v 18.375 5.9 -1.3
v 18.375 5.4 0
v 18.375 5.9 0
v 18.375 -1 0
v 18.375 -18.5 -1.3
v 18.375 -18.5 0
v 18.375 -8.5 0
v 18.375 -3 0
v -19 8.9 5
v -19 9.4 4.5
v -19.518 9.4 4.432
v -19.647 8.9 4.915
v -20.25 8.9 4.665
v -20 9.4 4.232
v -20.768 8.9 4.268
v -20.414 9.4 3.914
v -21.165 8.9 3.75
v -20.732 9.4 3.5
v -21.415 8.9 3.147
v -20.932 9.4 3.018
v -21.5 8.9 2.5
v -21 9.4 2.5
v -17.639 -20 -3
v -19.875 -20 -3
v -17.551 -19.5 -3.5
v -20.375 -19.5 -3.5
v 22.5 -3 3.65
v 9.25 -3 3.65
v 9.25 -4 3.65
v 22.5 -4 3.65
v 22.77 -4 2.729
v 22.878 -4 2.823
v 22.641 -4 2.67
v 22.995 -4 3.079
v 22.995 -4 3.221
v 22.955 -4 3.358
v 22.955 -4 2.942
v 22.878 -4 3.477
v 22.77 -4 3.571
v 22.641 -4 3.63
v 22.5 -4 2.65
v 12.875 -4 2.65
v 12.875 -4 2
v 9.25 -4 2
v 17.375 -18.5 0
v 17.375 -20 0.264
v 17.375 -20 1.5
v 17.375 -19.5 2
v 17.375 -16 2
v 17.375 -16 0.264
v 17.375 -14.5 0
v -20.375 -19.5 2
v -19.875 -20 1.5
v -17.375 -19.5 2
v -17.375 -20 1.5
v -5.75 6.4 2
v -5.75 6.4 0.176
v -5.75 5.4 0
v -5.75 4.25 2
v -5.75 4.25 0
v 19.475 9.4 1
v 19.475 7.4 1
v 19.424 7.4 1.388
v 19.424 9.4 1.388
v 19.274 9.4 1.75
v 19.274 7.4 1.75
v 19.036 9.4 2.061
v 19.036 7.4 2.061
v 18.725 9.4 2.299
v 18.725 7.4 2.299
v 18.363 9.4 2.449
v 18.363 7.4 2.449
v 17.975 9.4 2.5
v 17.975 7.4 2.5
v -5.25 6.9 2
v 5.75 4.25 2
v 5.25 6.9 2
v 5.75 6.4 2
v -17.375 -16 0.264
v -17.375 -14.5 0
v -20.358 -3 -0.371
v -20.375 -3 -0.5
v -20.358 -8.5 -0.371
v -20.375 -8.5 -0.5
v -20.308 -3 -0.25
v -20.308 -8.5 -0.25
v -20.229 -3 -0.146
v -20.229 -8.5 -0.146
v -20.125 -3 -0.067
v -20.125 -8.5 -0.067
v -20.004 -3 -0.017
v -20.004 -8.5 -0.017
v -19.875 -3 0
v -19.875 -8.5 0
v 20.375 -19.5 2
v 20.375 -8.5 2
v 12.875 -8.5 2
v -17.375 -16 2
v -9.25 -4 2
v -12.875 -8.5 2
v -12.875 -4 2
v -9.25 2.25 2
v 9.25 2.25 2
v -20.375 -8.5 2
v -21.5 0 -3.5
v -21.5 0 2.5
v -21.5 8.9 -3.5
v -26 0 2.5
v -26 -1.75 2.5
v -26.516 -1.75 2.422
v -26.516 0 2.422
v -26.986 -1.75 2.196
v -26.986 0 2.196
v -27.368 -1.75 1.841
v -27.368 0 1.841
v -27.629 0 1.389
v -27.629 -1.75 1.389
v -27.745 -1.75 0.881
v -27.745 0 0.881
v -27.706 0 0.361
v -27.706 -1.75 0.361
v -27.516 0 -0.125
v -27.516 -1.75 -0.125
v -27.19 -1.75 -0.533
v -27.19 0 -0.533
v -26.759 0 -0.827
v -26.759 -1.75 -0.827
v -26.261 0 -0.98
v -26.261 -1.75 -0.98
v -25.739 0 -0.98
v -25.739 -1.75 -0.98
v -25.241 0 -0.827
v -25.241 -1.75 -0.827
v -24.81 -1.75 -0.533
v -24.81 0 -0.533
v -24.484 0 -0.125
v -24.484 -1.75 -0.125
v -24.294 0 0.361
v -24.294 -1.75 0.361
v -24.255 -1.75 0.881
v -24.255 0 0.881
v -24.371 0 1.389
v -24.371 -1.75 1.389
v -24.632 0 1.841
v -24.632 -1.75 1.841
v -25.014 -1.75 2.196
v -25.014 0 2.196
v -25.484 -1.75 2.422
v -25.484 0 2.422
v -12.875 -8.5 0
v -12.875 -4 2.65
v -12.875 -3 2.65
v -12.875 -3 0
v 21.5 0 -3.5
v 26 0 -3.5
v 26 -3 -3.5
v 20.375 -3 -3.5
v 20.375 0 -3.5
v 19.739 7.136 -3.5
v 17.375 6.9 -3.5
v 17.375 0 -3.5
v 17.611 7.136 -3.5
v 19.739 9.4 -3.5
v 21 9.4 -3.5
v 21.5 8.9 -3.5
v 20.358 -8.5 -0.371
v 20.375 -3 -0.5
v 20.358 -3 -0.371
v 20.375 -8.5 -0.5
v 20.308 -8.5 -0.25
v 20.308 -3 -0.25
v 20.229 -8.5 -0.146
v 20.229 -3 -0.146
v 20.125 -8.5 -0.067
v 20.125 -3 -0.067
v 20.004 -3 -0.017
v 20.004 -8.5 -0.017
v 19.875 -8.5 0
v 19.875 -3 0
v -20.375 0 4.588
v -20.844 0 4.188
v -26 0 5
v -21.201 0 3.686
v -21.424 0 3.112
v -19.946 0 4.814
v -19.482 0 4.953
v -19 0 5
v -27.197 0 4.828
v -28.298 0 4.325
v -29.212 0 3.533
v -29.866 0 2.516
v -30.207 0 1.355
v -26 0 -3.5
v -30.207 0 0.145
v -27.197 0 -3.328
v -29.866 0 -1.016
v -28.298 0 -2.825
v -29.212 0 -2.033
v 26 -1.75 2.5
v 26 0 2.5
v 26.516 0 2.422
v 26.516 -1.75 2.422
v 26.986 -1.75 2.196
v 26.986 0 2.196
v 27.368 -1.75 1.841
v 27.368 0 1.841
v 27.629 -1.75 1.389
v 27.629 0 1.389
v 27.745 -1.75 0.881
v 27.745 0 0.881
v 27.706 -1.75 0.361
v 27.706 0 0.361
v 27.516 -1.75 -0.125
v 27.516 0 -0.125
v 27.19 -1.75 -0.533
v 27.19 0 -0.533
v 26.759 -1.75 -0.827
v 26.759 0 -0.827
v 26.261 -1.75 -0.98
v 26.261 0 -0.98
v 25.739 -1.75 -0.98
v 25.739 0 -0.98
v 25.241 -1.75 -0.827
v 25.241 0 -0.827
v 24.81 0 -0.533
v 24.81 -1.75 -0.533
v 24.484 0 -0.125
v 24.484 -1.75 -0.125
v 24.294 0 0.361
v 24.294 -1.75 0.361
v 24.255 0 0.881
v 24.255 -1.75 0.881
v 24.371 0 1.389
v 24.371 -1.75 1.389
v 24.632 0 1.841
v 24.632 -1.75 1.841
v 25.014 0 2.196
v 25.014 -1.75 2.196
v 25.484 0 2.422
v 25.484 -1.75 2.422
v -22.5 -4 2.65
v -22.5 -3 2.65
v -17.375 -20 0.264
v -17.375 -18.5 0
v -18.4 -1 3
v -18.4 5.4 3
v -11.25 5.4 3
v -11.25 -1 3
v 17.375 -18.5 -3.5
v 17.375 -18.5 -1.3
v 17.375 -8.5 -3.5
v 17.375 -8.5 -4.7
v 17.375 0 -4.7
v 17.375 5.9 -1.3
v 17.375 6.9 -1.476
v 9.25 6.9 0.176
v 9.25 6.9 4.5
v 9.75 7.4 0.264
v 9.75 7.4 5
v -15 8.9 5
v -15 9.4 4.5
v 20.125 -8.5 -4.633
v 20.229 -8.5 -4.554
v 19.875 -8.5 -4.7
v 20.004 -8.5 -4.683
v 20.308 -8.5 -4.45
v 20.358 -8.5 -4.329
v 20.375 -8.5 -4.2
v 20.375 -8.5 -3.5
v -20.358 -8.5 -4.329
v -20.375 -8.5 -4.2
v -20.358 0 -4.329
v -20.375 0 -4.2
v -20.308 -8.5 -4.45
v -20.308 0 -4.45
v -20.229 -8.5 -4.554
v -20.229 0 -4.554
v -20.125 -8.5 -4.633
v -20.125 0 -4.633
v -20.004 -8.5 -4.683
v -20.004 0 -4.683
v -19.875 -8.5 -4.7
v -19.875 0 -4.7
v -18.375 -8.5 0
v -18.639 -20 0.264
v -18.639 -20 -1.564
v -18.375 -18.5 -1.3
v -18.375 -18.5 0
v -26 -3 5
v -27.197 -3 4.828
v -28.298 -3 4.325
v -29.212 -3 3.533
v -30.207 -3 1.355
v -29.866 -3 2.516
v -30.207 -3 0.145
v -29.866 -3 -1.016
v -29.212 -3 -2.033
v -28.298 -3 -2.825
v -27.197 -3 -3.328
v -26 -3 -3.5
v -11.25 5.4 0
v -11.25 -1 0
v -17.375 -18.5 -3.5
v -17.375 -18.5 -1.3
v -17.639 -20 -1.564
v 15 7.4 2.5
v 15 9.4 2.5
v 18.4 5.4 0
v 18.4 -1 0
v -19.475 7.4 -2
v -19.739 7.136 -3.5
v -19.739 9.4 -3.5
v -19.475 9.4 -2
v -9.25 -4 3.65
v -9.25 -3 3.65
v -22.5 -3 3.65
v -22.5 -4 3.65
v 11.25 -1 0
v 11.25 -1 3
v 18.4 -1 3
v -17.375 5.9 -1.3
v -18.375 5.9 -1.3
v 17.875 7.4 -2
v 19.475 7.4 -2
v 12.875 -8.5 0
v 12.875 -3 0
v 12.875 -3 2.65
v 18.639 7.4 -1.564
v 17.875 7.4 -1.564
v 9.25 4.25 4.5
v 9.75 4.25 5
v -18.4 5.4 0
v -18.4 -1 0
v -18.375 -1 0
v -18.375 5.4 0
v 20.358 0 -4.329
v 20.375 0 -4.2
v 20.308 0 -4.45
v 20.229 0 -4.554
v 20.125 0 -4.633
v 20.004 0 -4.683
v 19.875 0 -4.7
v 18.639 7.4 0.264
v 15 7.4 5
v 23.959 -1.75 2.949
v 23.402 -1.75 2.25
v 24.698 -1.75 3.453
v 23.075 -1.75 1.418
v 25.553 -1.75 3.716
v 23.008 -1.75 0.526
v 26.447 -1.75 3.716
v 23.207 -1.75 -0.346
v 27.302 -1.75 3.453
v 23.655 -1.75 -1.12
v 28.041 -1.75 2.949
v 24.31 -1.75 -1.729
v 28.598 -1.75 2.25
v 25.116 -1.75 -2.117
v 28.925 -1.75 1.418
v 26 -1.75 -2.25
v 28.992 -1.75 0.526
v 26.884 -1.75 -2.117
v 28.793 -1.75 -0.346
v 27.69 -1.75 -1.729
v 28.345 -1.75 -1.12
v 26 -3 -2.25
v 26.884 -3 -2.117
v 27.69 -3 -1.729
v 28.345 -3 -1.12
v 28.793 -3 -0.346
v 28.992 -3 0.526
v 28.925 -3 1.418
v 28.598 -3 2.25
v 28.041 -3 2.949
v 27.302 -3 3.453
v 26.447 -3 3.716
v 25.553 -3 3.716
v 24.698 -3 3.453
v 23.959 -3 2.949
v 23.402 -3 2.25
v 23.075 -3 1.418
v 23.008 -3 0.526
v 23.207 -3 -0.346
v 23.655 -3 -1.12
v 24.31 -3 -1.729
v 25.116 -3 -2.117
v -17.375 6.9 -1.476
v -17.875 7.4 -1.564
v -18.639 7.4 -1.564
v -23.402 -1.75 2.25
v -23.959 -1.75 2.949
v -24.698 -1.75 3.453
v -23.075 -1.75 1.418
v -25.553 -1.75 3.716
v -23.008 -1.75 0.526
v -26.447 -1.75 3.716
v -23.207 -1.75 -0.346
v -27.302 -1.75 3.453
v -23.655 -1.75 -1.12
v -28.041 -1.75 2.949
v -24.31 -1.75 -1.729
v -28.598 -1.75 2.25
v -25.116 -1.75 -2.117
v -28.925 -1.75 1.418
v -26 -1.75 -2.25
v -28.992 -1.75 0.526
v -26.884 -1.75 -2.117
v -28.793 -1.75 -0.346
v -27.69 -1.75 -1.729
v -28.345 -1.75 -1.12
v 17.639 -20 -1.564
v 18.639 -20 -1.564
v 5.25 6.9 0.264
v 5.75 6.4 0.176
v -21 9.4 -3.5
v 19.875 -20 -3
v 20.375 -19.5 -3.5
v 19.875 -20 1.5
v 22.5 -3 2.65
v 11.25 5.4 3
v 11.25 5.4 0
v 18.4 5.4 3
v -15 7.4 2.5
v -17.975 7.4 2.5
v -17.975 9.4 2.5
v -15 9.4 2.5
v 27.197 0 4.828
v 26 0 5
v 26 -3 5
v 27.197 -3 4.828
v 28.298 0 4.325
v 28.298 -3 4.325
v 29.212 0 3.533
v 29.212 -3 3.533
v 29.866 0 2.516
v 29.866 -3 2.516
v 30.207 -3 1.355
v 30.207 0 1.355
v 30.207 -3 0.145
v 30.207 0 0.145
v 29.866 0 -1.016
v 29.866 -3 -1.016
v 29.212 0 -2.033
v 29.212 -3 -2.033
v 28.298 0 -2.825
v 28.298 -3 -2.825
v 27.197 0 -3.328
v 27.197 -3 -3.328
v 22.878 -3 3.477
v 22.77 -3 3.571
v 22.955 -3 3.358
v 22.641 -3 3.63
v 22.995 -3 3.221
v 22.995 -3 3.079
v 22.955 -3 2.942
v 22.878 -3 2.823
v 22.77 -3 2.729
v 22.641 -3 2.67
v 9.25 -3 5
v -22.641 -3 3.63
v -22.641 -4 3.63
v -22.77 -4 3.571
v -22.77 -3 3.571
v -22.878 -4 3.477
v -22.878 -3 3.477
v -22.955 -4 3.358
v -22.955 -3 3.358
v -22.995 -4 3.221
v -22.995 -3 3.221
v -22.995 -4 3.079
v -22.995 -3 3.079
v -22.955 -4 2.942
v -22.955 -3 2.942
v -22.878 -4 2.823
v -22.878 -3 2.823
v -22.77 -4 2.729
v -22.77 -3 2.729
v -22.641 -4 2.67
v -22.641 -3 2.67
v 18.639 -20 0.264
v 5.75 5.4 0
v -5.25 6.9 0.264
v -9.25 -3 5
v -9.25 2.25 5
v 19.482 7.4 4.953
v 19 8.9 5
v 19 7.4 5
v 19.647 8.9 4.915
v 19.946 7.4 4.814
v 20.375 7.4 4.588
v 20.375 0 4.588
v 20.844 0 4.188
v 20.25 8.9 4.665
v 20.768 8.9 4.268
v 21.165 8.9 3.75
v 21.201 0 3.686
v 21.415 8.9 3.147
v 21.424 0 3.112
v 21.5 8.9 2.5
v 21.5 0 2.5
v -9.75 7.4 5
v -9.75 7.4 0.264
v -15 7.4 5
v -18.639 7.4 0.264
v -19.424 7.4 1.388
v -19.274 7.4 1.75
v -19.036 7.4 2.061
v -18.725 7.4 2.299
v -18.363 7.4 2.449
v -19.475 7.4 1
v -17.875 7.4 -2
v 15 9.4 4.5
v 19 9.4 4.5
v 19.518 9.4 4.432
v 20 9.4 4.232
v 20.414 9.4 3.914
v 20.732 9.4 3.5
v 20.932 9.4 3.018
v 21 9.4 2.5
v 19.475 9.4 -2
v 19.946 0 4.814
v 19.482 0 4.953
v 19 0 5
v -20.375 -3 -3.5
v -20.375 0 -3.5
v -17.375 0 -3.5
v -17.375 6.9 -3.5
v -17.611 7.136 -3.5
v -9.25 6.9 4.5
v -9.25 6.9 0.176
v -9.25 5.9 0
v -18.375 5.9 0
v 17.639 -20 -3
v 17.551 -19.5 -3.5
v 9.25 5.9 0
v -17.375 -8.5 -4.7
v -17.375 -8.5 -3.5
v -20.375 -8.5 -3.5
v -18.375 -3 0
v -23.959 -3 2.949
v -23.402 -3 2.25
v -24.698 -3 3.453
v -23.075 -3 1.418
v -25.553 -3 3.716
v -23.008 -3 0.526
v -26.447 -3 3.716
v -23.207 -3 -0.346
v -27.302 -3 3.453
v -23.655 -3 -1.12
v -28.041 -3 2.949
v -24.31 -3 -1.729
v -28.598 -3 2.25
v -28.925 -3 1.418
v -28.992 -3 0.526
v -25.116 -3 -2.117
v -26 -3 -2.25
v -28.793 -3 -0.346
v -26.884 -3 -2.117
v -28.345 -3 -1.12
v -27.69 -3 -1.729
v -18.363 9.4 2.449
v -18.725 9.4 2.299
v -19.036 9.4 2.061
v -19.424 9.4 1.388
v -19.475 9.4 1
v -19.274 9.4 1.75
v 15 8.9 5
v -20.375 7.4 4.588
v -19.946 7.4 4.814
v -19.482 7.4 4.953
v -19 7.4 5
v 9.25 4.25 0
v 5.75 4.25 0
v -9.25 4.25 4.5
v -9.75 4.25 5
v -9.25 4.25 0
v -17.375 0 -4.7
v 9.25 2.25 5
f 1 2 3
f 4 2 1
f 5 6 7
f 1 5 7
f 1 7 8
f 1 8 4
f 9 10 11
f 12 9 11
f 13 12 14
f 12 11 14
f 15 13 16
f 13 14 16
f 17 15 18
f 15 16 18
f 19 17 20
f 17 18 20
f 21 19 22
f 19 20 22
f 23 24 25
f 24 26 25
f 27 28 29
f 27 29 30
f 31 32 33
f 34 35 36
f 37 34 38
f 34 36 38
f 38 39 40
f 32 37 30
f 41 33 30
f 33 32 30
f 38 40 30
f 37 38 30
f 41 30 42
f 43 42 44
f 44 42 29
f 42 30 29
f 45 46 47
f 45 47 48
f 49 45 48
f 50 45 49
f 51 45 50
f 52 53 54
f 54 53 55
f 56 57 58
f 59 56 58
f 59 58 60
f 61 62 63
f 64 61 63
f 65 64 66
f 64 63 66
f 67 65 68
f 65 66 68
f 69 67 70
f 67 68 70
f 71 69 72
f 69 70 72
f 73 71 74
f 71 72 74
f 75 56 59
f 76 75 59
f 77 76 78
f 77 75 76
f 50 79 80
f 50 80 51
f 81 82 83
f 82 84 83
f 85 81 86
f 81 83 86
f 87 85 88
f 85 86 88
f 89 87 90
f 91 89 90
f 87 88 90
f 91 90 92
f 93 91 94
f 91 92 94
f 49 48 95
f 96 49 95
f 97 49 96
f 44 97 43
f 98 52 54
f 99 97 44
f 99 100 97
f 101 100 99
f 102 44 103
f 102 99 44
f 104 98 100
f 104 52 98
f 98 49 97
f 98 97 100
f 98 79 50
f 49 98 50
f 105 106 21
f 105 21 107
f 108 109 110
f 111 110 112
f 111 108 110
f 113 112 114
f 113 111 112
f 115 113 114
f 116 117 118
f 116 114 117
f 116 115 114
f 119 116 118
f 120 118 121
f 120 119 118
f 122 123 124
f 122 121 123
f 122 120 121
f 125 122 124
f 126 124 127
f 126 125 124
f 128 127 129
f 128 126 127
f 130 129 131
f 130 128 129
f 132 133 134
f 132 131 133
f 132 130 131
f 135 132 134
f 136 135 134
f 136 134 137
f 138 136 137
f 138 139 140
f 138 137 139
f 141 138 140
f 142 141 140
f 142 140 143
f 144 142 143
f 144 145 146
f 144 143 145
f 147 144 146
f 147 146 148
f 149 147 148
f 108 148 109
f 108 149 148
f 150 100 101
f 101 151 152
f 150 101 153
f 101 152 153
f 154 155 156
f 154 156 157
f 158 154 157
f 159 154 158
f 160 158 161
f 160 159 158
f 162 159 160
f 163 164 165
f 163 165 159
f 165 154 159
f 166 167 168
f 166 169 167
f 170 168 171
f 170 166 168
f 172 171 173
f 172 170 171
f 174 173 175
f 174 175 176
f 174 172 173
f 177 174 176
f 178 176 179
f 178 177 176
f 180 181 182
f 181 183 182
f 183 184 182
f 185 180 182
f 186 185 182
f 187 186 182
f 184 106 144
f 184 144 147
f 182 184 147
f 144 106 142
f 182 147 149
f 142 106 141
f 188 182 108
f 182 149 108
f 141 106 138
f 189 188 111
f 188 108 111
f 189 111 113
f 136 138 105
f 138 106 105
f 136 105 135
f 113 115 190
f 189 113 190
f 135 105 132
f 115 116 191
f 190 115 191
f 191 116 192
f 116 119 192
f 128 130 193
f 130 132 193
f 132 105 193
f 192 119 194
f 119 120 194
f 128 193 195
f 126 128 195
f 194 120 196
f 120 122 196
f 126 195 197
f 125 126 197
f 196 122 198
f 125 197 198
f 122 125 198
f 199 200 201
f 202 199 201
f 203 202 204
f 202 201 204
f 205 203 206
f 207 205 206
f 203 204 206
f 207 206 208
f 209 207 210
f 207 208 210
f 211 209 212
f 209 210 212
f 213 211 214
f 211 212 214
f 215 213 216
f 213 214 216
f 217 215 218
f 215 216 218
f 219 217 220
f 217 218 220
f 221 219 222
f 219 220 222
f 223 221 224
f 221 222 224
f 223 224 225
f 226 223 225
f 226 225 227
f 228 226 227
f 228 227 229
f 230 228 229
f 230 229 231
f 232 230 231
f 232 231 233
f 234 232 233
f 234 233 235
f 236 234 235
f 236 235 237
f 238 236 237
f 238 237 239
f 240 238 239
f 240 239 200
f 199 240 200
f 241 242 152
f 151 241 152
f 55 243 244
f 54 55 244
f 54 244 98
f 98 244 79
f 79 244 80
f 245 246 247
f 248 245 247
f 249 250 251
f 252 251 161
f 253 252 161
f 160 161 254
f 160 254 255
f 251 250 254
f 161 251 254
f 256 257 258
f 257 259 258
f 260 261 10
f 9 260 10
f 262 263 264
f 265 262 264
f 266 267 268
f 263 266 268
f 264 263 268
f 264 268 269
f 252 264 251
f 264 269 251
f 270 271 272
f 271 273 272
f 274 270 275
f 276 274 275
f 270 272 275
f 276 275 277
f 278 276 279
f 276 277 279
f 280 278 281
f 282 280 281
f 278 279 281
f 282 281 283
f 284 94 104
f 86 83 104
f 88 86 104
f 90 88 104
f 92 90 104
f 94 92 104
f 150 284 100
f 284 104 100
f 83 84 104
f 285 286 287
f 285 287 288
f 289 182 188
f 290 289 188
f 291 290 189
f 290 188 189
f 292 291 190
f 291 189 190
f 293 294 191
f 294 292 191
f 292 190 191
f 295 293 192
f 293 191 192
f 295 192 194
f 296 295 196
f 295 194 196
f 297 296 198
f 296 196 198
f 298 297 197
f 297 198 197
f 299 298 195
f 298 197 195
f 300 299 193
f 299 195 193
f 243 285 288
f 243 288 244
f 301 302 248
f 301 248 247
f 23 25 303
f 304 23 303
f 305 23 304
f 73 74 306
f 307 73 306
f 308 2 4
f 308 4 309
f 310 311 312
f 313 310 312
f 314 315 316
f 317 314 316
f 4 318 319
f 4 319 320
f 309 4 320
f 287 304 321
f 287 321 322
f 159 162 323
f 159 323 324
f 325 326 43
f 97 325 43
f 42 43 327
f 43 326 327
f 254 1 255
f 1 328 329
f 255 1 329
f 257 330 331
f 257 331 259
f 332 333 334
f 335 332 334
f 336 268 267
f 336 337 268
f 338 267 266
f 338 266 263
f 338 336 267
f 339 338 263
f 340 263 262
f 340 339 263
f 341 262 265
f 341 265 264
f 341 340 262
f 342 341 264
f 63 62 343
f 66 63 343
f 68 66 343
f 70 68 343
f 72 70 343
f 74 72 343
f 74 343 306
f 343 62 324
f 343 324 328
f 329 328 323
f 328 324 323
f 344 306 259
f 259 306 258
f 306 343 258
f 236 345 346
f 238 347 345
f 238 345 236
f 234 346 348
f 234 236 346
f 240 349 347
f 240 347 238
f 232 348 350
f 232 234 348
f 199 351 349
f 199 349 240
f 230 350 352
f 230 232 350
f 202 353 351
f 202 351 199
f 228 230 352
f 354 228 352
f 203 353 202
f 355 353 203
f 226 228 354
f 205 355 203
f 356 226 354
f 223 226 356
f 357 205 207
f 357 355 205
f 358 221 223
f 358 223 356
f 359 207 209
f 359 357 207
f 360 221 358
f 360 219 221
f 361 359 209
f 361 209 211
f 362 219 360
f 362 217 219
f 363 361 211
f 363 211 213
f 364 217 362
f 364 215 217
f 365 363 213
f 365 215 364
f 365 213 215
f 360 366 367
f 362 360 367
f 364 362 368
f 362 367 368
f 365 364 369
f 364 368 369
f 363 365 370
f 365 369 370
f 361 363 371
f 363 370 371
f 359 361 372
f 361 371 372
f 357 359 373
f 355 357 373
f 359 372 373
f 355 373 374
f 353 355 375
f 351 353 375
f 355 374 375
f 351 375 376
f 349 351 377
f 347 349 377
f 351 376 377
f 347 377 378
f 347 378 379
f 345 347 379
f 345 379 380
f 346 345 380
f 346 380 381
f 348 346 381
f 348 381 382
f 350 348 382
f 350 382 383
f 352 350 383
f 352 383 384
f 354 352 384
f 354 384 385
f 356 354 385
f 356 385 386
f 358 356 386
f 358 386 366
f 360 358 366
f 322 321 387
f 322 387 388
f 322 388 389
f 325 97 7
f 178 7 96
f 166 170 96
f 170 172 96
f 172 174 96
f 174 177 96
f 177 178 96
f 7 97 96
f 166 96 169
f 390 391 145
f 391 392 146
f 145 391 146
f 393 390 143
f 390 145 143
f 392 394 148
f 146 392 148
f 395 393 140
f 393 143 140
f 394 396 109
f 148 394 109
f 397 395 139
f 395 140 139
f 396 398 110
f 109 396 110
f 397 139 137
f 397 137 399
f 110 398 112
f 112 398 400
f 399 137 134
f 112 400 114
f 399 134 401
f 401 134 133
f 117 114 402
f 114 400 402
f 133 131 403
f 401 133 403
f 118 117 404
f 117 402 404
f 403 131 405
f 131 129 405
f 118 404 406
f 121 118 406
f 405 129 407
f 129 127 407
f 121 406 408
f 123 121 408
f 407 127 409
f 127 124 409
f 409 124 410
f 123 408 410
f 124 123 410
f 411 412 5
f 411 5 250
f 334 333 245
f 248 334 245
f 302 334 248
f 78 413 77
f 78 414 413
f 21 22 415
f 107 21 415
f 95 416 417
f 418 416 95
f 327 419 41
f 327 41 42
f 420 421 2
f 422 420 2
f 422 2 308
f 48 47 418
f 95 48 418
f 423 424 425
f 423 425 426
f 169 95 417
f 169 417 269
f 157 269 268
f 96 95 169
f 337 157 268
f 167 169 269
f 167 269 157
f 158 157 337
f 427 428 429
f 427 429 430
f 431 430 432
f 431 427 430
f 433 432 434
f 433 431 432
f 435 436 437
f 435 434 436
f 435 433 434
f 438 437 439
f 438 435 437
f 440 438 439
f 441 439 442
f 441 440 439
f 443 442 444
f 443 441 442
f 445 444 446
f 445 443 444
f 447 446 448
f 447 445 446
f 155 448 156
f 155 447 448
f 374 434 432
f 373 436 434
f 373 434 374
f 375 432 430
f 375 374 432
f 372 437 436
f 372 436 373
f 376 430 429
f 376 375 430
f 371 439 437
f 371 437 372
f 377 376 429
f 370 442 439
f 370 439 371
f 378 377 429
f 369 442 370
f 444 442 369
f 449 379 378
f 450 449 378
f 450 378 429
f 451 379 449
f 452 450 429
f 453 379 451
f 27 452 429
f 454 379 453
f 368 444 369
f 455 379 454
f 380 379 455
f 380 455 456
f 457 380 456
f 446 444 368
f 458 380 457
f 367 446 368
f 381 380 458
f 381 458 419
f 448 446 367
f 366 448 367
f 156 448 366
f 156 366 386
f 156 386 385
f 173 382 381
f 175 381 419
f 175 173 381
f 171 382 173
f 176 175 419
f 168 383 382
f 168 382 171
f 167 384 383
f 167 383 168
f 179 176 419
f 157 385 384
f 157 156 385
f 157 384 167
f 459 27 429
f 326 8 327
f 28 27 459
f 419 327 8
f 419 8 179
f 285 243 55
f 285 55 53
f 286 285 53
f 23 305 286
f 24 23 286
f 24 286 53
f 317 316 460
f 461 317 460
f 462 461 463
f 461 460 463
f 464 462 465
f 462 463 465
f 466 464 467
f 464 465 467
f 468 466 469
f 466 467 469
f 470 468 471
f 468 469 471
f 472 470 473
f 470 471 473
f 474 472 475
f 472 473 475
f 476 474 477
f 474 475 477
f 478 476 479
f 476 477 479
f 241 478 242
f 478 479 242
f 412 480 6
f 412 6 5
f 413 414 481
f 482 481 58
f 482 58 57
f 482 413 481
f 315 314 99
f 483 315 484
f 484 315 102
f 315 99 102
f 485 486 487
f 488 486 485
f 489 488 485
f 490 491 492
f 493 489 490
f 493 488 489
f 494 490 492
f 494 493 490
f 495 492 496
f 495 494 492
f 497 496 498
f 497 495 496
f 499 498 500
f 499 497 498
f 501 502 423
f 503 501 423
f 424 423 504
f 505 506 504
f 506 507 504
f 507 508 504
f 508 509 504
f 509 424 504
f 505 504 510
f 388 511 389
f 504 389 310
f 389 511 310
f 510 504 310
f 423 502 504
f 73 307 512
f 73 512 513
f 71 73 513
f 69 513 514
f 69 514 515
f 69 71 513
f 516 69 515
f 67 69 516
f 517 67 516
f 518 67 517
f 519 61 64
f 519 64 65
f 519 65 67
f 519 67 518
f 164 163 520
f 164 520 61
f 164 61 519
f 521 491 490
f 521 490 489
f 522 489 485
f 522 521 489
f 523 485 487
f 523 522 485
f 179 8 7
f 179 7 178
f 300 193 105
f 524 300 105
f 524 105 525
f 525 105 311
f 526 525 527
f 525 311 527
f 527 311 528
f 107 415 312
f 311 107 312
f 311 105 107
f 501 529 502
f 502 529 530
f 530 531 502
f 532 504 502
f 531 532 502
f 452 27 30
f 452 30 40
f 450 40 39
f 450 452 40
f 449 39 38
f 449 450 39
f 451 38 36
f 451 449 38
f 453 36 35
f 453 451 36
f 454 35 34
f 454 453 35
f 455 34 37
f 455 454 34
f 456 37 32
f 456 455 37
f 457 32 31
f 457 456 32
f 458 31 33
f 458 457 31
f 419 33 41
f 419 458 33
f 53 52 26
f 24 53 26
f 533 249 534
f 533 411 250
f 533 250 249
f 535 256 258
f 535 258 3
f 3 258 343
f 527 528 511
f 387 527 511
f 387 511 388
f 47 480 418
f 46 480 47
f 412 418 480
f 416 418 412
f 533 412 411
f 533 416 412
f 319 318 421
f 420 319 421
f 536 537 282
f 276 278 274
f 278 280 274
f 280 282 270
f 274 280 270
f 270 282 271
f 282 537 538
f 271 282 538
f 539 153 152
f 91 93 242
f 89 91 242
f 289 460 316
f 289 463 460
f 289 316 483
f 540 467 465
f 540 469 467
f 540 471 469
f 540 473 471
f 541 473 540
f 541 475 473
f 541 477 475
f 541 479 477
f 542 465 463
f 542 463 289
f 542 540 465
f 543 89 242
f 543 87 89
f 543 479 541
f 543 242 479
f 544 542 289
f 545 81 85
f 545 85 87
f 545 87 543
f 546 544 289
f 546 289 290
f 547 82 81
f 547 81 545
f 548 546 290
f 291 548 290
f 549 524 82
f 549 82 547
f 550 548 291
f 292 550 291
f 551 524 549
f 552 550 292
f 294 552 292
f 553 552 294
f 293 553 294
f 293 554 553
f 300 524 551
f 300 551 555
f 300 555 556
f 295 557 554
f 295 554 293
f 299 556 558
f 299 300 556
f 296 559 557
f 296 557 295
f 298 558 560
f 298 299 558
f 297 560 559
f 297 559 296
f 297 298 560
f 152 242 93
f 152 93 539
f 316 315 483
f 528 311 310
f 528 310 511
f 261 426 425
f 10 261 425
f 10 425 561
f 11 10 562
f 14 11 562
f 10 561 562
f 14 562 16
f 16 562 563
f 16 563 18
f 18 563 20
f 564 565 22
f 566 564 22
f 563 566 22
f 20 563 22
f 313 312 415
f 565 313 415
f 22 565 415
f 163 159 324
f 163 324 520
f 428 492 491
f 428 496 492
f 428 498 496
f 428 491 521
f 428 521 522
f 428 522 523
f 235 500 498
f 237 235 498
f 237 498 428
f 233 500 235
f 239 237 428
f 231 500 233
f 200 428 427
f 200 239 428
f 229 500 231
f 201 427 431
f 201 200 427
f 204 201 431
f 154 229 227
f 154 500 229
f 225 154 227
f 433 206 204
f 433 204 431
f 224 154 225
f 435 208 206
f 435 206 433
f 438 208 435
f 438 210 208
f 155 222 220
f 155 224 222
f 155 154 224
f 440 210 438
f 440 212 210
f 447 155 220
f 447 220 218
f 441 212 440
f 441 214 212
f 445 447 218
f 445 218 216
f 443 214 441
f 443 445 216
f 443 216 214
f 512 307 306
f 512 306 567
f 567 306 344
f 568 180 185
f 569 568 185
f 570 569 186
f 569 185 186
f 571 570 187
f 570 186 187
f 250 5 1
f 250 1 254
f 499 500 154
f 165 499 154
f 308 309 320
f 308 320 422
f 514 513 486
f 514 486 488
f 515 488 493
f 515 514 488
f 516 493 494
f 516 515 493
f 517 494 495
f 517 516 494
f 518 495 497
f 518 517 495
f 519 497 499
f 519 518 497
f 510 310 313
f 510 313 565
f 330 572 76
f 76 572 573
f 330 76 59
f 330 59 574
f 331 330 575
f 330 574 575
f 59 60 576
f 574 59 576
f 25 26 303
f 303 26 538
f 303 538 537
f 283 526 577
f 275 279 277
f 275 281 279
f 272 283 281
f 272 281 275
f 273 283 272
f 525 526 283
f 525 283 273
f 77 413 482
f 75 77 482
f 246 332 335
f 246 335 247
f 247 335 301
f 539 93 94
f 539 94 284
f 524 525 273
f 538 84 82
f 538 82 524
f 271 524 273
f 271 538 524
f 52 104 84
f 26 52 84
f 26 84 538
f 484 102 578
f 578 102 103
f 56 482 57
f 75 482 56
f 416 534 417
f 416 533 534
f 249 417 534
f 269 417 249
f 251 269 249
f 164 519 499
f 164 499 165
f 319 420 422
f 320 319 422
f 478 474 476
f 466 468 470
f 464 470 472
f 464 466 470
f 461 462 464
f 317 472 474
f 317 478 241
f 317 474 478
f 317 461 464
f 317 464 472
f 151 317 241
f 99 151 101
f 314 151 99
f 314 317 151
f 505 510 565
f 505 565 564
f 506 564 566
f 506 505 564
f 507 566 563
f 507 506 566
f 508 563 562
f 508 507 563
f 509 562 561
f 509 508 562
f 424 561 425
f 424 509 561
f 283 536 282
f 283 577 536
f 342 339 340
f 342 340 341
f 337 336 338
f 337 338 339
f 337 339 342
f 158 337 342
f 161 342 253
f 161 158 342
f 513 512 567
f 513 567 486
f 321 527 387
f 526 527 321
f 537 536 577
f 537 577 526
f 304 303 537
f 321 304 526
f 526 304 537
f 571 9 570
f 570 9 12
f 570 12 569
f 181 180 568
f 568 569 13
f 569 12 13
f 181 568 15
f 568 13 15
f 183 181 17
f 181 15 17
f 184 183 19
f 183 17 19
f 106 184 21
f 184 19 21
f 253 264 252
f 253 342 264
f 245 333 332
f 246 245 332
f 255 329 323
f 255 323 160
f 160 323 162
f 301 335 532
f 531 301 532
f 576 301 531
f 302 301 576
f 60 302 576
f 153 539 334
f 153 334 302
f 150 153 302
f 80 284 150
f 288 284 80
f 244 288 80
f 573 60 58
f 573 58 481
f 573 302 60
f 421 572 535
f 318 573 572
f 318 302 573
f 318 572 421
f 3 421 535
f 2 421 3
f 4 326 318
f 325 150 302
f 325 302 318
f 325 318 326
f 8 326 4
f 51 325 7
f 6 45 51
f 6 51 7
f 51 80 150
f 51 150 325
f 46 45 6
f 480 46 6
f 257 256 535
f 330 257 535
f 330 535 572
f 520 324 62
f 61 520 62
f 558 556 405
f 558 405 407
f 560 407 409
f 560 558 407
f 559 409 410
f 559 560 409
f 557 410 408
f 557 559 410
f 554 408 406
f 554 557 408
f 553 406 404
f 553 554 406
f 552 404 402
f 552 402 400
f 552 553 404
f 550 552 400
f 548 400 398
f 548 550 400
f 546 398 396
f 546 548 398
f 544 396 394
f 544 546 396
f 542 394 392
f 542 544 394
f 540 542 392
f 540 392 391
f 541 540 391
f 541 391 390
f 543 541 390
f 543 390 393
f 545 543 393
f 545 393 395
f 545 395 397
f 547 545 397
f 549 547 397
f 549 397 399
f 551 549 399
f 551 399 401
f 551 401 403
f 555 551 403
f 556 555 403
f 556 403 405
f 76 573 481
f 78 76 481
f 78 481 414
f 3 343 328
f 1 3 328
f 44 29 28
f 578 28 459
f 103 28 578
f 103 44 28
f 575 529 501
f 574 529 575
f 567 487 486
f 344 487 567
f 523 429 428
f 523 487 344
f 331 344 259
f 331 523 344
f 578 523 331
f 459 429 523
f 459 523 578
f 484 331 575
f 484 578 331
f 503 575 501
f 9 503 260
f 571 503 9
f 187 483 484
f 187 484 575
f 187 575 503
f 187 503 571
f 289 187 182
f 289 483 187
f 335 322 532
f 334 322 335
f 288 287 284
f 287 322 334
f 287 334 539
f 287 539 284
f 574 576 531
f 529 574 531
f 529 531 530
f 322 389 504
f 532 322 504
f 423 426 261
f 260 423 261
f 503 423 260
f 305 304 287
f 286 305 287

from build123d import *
from OCP.BRepFilletAPI import BRepFilletAPI_MakeChamfer

# Parameters (mm, degrees)
BOSS_EXTRUDE1_DEPTH             = 7.4
BOSS_EXTRUDE1_DEPTH_BACK        = 20
SKETCH2_R                       = 1.75
BOSS_EXTRUDE2_DEPTH             = 3
BOSS_EXTRUDE7_DEPTH             = 2
BOSS_EXTRUDE7_DIRECTION_2_REACH = 43.12
SKETCH21_R                      = 3
CUT_EXTRUDE11_DEPTH             = 1.25
CUT_EXTRUDE10_START             = -7.4
CUT_EXTRUDE10_DEPTH             = 7.4
CUT_EXTRUDE3_DEPTH              = 37.60686411
CUT_EXTRUDE3_DEPTH_BACK         = 37.60686411
SKETCH12_W                      = 3
SKETCH12_H                      = 17
CUT_EXTRUDE6_DEPTH              = 37.60686411
SKETCH19_W                      = 18.5
SKETCH19_H                      = 3.15
SKETCH19_H_2                    = 5.25
CUT_EXTRUDE9_DEPTH              = 37.678501878
SHELL1_OUTLINE_W                = 7.15
SHELL1_OUTLINE_H                = 6.4
SHELL1_DEPTH                    = 3
SKETCH13_W                      = 34.75
SKETCH13_H                      = 4
CUT_EXTRUDE4_DEPTH              = 37.60686411
SKETCH22_W                      = 7.5
SKETCH22_H                      = 2
CUT_EXTRUDE12_DEPTH             = 5.5
SKETCH23_W                      = 3
SKETCH23_H                      = 8.5
BOSS_EXTRUDE8_DEPTH             = 1.2
FILLET2_R                       = 0.5
CHAMFER3_SIZE                   = 0.5
CHAMFER4_SIZE                   = 0.5
BOSS_EXTRUDE9_DEPTH             = 1
CHAMFER5_SIZE                   = 1.5
CHAMFER5_SIZE2                  = 0.264490471


# Read off the part's stored shape, not the designer's step: Shell1
with BuildPart() as part:
    # Sketch1 → Boss-Extrude1 (new, two sides: drawn at the far end of the back side and taken through both)
    with BuildSketch(Plane(origin=(0, 0, 0), x_dir=(1, 0, 0), z_dir=(0, 1, 0)).offset(-BOSS_EXTRUDE1_DEPTH_BACK)):
        Polygon((17.375, 3.5), (20.375, 3.5), (20.375, -5), (-20.375, -5), (-20.375, 3.5), (-17.375, 3.5), (-17.375, 1.3), (-18.375, 1.3), (-18.375, 0), (18.375, 0), (18.375, 1.3), (17.375, 1.3), align=None)
    extrude(amount=BOSS_EXTRUDE1_DEPTH + BOSS_EXTRUDE1_DEPTH_BACK)

    # Sketch2 → Boss-Extrude2 (add)
    with BuildSketch(Plane(origin=(0, 0, 0), x_dir=(1, 0, 0), z_dir=(0, 1, 0))):
        with BuildLine():
            Line((20.375, -5), (26, -5))
            ThreePointArc((26, -5), (30.25, -0.75), (26, 3.5))
            Line((26, 3.5), (20.375, 3.5))
            Line((20.375, 3.5), (20.375, -5))
        make_face()
        with Locations(Location((26, -0.75, 0), (0, 0, 270))):
            Circle(SKETCH2_R, mode=Mode.SUBTRACT)
    boss_extrude2 = extrude(amount=-BOSS_EXTRUDE2_DEPTH)

    # Sketch8 → Boss-Extrude7 (add)
    with BuildSketch(Plane(origin=(0, 7.4, 0), x_dir=(1, 0, 0), z_dir=(0, 1, 0))):
        with BuildLine():
            Line((15, -5), (19, -5))
            ThreePointArc((19, -5), (20.767766953, -4.267766953), (21.5, -2.5))
            Line((21.5, -2.5), (21.5, 3.5))
            Line((21.5, 3.5), (19.475, 3.5))
            Line((19.475, 3.5), (19.475, -1))
            ThreePointArc((19.475, -1), (19.035660172, -2.060660172), (17.975, -2.5))
            Line((17.975, -2.5), (15, -2.5))
            Line((15, -2.5), (15, -5))
        make_face()
    boss_extrude7 = extrude(amount=BOSS_EXTRUDE7_DEPTH)

    # Sketch8 → Boss-Extrude7 direction 2 (add, up to next)
    with BuildSketch(Plane(origin=(0, 7.4, 0), x_dir=(1, 0, 0), z_dir=(0, 1, 0)), mode=Mode.PRIVATE) as boss_extrude7_direction_2_sk1:
        with BuildLine():
            Line((15, -5), (19, -5))
            ThreePointArc((19, -5), (20.767766953, -4.267766953), (21.5, -2.5))
            Line((21.5, -2.5), (21.5, 3.5))
            Line((21.5, 3.5), (19.475, 3.5))
            Line((19.475, 3.5), (19.475, -1))
            ThreePointArc((19.475, -1), (19.035660172, -2.060660172), (17.975, -2.5))
            Line((17.975, -2.5), (15, -2.5))
            Line((15, -2.5), (15, -5))
        make_face()
    boss_extrude7_direction_2_tool1 = extrude(boss_extrude7_direction_2_sk1.sketch, amount=-BOSS_EXTRUDE7_DIRECTION_2_REACH, mode=Mode.PRIVATE) - part.part
    boss_extrude7_direction_2 = boss_extrude7_direction_2_tool1.solids().sort_by_distance((16.4875, 7.4, 2.607005))[0]
    add(boss_extrude7_direction_2)

    # Sketch21 → Cut-Extrude11 (cut)
    with BuildSketch(Plane.XZ.offset(3)):
        with Locations(Location((26, 0.75, 0), (0, 0, 270))):
            Circle(SKETCH21_R)
    cut_extrude11 = extrude(amount=-CUT_EXTRUDE11_DEPTH, mode=Mode.SUBTRACT)

    # Sketch20 → Cut-Extrude10 (cut)
    with BuildSketch(Plane(origin=(0, 7.4, 0), x_dir=(1, 0, 0), z_dir=(0, 1, 0)).offset(CUT_EXTRUDE10_START)):
        with BuildLine():
            Line((20.375, -5), (20.375, -4.587911636))
            ThreePointArc((20.375, -4.587911636), (19.717711958, -4.894762941), (19, -5))
            Line((19, -5), (20.375, -5))
        make_face()
    cut_extrude10 = extrude(amount=CUT_EXTRUDE10_DEPTH, mode=Mode.SUBTRACT)

    # Mirror1: Boss-Extrude2, Boss-Extrude7, Boss-Extrude7 direction 2, Cut-Extrude11, Cut-Extrude10 across plane
    add(boss_extrude2.mirror(Plane(origin=(0, 0, 0), x_dir=(0, 0, 1), z_dir=(1, 0, 0))))
    add(boss_extrude7.mirror(Plane(origin=(0, 0, 0), x_dir=(0, 0, 1), z_dir=(1, 0, 0))))
    add(boss_extrude7_direction_2.mirror(Plane(origin=(0, 0, 0), x_dir=(0, 0, 1), z_dir=(1, 0, 0))))
    add(cut_extrude11.mirror(Plane(origin=(0, 0, 0), x_dir=(0, 0, 1), z_dir=(1, 0, 0))), mode=Mode.SUBTRACT)
    add(cut_extrude10.mirror(Plane(origin=(0, 0, 0), x_dir=(0, 0, 1), z_dir=(1, 0, 0))), mode=Mode.SUBTRACT)

    # Sketch12 → Cut-Extrude3 (cut, two sides: drawn at the far end of the back side and taken through both)
    with BuildSketch(Plane(origin=(0, 0, 0), x_dir=(0, 0, -1), z_dir=(1, 0, 0)).offset(-CUT_EXTRUDE3_DEPTH_BACK)):
        with Locations((-3.5, -11.5)):
            Rectangle(SKETCH12_W, SKETCH12_H)
    extrude(amount=CUT_EXTRUDE3_DEPTH + CUT_EXTRUDE3_DEPTH_BACK, mode=Mode.SUBTRACT)

    # Sketch15 → Cut-Extrude6 (cut, through all)
    with BuildSketch(Plane(origin=(0, 0, 0), x_dir=(-1, 0, 0), z_dir=(0, 0, -1))):
        Polygon((-9.25, 7.4), (-9.25, 4.25), (-5.75, 4.25), (-5.75, 6.9), (5.75, 6.9), (5.75, 4.25), (9.25, 4.25), (9.25, 7.4), align=None)
    extrude(amount=-CUT_EXTRUDE6_DEPTH, mode=Mode.SUBTRACT)

    # Sketch19 → Cut-Extrude9 (cut, through all)
    with BuildSketch(Plane.XY.offset(2)):
        with Locations((0, 5.825)):
            Rectangle(SKETCH19_W, SKETCH19_H)
        with Locations((0, -0.375)):
            Rectangle(SKETCH19_W, SKETCH19_H_2)
    extrude(amount=CUT_EXTRUDE9_DEPTH, mode=Mode.SUBTRACT)

    # Shell1 outline → Shell1 (cut)
    with BuildSketch(Plane.XY):
        with Locations((14.825, 2.2)):
            Rectangle(SHELL1_OUTLINE_W, SHELL1_OUTLINE_H)
        with Locations((-14.825, 2.2)):
            Rectangle(SHELL1_OUTLINE_W, SHELL1_OUTLINE_H)
    extrude(amount=SHELL1_DEPTH, mode=Mode.SUBTRACT)

    # Sketch13 → Cut-Extrude4 (cut, through all)
    with BuildSketch(Plane.XY):
        with Locations((0, -18)):
            Rectangle(SKETCH13_W, SKETCH13_H)
    extrude(amount=CUT_EXTRUDE4_DEPTH, mode=Mode.SUBTRACT)

    # Sketch22 → Cut-Extrude12 (cut)
    with BuildSketch(Plane.XZ.offset(3)):
        with Locations((16.625, 1)):
            Rectangle(SKETCH22_W, SKETCH22_H)
        with Locations((-16.625, 1)):
            Rectangle(SKETCH22_W, SKETCH22_H)
    extrude(amount=CUT_EXTRUDE12_DEPTH, mode=Mode.SUBTRACT)

    # Sketch23 → Boss-Extrude8 (add)
    with BuildSketch(Plane(origin=(0, 0, -3.5), x_dir=(-1, 0, 0), z_dir=(0, 0, -1))):
        with Locations((-18.875, -4.25)):
            Rectangle(SKETCH23_W, SKETCH23_H)
        with Locations((18.875, -4.25)):
            Rectangle(SKETCH23_W, SKETCH23_H)
    extrude(amount=BOSS_EXTRUDE8_DEPTH)

    # Fillet2
    fillet2_edges = [part.edges().sort_by_distance(p)[0] for p in [
        (20.375, -5.75, 0),
        (-20.375, -5.75, 0),
        (20.375, -4.25, -4.7),
        (-20.375, -4.25, -4.7),
    ]]
    fillet(fillet2_edges, radius=FILLET2_R)

    # Chamfer3
    chamfer3_edges = [part.edges().sort_by_distance(p)[0] for p in [
        (-20.767766953, 9.4, 4.267766953),
        (-21.5, 9.4, -0.5),
        (-17, 9.4, 5),
        (9.25, 7.4, 2.5),
        (-9.25, 5.825, 5),
        (-9.25, 7.4, 2.5),
        (9.25, 5.825, 5),
        (5.75, 6.9, 1),
        (-5.75, 6.9, 1),
        (17.375, 7.4, -2.4),
        (-17.375, 7.4, -2.4),
        (17, 9.4, 5),
        (20.767766953, 9.4, 4.267766953),
        (21.5, 9.4, -0.5),
    ]]
    chamfer(chamfer3_edges, length=CHAMFER3_SIZE)

    # Chamfer4
    chamfer4_edges = [part.edges().sort_by_distance(p)[0] for p in [
        (18.875, -20, -3.5),
        (20.375, -20, -0.75),
        (-18.875, -20, 2),
        (18.875, -20, 2),
        (-18.875, -20, -3.5),
        (-20.375, -20, -0.75),
    ]]
    chamfer(chamfer4_edges, length=CHAMFER4_SIZE)

    # Sketch25 → Boss-Extrude9 (add)
    with BuildSketch(Plane.XZ.offset(3)):
        with BuildLine():
            Line((-22.5, 2.65), (-12.875, 2.65))
            Line((-12.875, 2.65), (-12.875, 2))
            Line((-12.875, 2), (-9.25, 2))
            Line((-9.25, 2), (-9.25, 3.65))
            Line((-9.25, 3.65), (-22.5, 3.65))
            ThreePointArc((-22.5, 3.65), (-23, 3.15), (-22.5, 2.65))
        make_face()
        with BuildLine():
            Line((9.25, 2), (9.25, 3.65))
            Line((9.25, 3.65), (22.5, 3.65))
            ThreePointArc((22.5, 3.65), (23, 3.15), (22.5, 2.65))
            Line((22.5, 2.65), (12.875, 2.65))
            Line((12.875, 2.65), (12.875, 2))
            Line((12.875, 2), (9.25, 2))
        make_face()
    extrude(amount=BOSS_EXTRUDE9_DEPTH)

    # Chamfer5: one chamfer whose edges measure the first distance from different faces: ONE call of the kernel's chamfer builder (chamfer() names one face for all edges)
    chamfer5_edges_1 = [part.edges().sort_by_distance(p)[0] for p in [
        (-19.475, 8.4, -3.5),
    ]]
    chamfer5_side_1 = [part.faces().sort_by_distance(p)[0] for p in [
        (-19.475, 8.4, -1.25),
    ]]
    chamfer5_edges_2 = [part.edges().sort_by_distance(p)[0] for p in [
        (17.875, -20, -1.3),
        (18.125, 7.4, -1.3),
    ]]
    chamfer5_side_2 = [part.faces().sort_by_distance(p)[0] for p in [
        (17.87652765, -6.362022609, -1.3),
    ]]
    chamfer5_edges_3 = [part.edges().sort_by_distance(p)[0] for p in [
        (18.375, -20, -0.65),
        (18.375, 7.4, -0.65),
    ]]
    chamfer5_side_3 = [part.faces().sort_by_distance(p)[0] for p in [
        (18.375, -6.3, -0.65),
    ]]
    chamfer5_edges_4 = [part.edges().sort_by_distance(p)[0] for p in [
        (17.875, -20, 0),
        (-17.875, -20, 0),
        (0, -16, 0),
        (14.0625, 7.4, 0),
        (-14.0625, 7.4, 0),
        (0, 6.9, 0),
    ]]
    chamfer5_side_4 = [part.faces().sort_by_distance(p)[0] for p in [
        (0, -5.621913535, 0),
    ]]
    chamfer5_edges_5 = [part.edges().sort_by_distance(p)[0] for p in [
        (-18.375, -20, -0.65),
        (-18.375, 7.4, -0.65),
    ]]
    chamfer5_side_5 = [part.faces().sort_by_distance(p)[0] for p in [
        (-18.375, -6.3, -0.65),
    ]]
    chamfer5_edges_6 = [part.edges().sort_by_distance(p)[0] for p in [
        (-17.875, -20, -1.3),
        (-18.125, 7.4, -1.3),
    ]]
    chamfer5_side_6 = [part.faces().sort_by_distance(p)[0] for p in [
        (-17.87652765, -6.362022609, -1.3),
    ]]
    chamfer5_edges_7 = [part.edges().sort_by_distance(p)[0] for p in [
        (-17.375, -20, -2.15),
    ]]
    chamfer5_side_7 = [part.faces().sort_by_distance(p)[0] for p in [
        (-17.375, -6.18727649, -2.648694438),
    ]]
    chamfer5_edges_8 = [part.edges().sort_by_distance(p)[0] for p in [
        (-18.675, 7.4, -3.5),
    ]]
    chamfer5_side_8 = [part.faces().sort_by_distance(p)[0] for p in [
        (-14.347937222, 7.4, 1.651046547),
    ]]
    chamfer5_edges_9 = [part.edges().sort_by_distance(p)[0] for p in [
        (17.375, -20, -2.15),
    ]]
    chamfer5_side_9 = [part.faces().sort_by_distance(p)[0] for p in [
        (17.375, -6.18727649, -2.648694438),
    ]]
    chamfer5_edges_10 = [part.edges().sort_by_distance(p)[0] for p in [
        (18.675, 7.4, -3.5),
    ]]
    chamfer5_side_10 = [part.faces().sort_by_distance(p)[0] for p in [
        (14.347937222, 7.4, 1.651046547),
    ]]
    chamfer5_edges_11 = [part.edges().sort_by_distance(p)[0] for p in [
        (19.475, 8.4, -3.5),
    ]]
    chamfer5_side_11 = [part.faces().sort_by_distance(p)[0] for p in [
        (19.475, 8.4, -1.25),
    ]]
    chamfer5 = BRepFilletAPI_MakeChamfer(part.part.solid().wrapped)
    for e in chamfer5_edges_1:
        chamfer5.Add(CHAMFER5_SIZE, CHAMFER5_SIZE2, e.wrapped, chamfer5_side_1[0].wrapped)  # the first distance lies on this face
    for e in chamfer5_edges_2:
        chamfer5.Add(CHAMFER5_SIZE, CHAMFER5_SIZE2, e.wrapped, chamfer5_side_2[0].wrapped)  # the first distance lies on this face
    for e in chamfer5_edges_3:
        chamfer5.Add(CHAMFER5_SIZE, CHAMFER5_SIZE2, e.wrapped, chamfer5_side_3[0].wrapped)  # the first distance lies on this face
    for e in chamfer5_edges_4:
        chamfer5.Add(CHAMFER5_SIZE, CHAMFER5_SIZE2, e.wrapped, chamfer5_side_4[0].wrapped)  # the first distance lies on this face
    for e in chamfer5_edges_5:
        chamfer5.Add(CHAMFER5_SIZE, CHAMFER5_SIZE2, e.wrapped, chamfer5_side_5[0].wrapped)  # the first distance lies on this face
    for e in chamfer5_edges_6:
        chamfer5.Add(CHAMFER5_SIZE, CHAMFER5_SIZE2, e.wrapped, chamfer5_side_6[0].wrapped)  # the first distance lies on this face
    for e in chamfer5_edges_7:
        chamfer5.Add(CHAMFER5_SIZE, CHAMFER5_SIZE2, e.wrapped, chamfer5_side_7[0].wrapped)  # the first distance lies on this face
    for e in chamfer5_edges_8:
        chamfer5.Add(CHAMFER5_SIZE, CHAMFER5_SIZE2, e.wrapped, chamfer5_side_8[0].wrapped)  # the first distance lies on this face
    for e in chamfer5_edges_9:
        chamfer5.Add(CHAMFER5_SIZE, CHAMFER5_SIZE2, e.wrapped, chamfer5_side_9[0].wrapped)  # the first distance lies on this face
    for e in chamfer5_edges_10:
        chamfer5.Add(CHAMFER5_SIZE, CHAMFER5_SIZE2, e.wrapped, chamfer5_side_10[0].wrapped)  # the first distance lies on this face
    for e in chamfer5_edges_11:
        chamfer5.Add(CHAMFER5_SIZE, CHAMFER5_SIZE2, e.wrapped, chamfer5_side_11[0].wrapped)  # the first distance lies on this face
    add(Compound.cast(chamfer5.Shape()), mode=Mode.REPLACE)


solid = part.part
